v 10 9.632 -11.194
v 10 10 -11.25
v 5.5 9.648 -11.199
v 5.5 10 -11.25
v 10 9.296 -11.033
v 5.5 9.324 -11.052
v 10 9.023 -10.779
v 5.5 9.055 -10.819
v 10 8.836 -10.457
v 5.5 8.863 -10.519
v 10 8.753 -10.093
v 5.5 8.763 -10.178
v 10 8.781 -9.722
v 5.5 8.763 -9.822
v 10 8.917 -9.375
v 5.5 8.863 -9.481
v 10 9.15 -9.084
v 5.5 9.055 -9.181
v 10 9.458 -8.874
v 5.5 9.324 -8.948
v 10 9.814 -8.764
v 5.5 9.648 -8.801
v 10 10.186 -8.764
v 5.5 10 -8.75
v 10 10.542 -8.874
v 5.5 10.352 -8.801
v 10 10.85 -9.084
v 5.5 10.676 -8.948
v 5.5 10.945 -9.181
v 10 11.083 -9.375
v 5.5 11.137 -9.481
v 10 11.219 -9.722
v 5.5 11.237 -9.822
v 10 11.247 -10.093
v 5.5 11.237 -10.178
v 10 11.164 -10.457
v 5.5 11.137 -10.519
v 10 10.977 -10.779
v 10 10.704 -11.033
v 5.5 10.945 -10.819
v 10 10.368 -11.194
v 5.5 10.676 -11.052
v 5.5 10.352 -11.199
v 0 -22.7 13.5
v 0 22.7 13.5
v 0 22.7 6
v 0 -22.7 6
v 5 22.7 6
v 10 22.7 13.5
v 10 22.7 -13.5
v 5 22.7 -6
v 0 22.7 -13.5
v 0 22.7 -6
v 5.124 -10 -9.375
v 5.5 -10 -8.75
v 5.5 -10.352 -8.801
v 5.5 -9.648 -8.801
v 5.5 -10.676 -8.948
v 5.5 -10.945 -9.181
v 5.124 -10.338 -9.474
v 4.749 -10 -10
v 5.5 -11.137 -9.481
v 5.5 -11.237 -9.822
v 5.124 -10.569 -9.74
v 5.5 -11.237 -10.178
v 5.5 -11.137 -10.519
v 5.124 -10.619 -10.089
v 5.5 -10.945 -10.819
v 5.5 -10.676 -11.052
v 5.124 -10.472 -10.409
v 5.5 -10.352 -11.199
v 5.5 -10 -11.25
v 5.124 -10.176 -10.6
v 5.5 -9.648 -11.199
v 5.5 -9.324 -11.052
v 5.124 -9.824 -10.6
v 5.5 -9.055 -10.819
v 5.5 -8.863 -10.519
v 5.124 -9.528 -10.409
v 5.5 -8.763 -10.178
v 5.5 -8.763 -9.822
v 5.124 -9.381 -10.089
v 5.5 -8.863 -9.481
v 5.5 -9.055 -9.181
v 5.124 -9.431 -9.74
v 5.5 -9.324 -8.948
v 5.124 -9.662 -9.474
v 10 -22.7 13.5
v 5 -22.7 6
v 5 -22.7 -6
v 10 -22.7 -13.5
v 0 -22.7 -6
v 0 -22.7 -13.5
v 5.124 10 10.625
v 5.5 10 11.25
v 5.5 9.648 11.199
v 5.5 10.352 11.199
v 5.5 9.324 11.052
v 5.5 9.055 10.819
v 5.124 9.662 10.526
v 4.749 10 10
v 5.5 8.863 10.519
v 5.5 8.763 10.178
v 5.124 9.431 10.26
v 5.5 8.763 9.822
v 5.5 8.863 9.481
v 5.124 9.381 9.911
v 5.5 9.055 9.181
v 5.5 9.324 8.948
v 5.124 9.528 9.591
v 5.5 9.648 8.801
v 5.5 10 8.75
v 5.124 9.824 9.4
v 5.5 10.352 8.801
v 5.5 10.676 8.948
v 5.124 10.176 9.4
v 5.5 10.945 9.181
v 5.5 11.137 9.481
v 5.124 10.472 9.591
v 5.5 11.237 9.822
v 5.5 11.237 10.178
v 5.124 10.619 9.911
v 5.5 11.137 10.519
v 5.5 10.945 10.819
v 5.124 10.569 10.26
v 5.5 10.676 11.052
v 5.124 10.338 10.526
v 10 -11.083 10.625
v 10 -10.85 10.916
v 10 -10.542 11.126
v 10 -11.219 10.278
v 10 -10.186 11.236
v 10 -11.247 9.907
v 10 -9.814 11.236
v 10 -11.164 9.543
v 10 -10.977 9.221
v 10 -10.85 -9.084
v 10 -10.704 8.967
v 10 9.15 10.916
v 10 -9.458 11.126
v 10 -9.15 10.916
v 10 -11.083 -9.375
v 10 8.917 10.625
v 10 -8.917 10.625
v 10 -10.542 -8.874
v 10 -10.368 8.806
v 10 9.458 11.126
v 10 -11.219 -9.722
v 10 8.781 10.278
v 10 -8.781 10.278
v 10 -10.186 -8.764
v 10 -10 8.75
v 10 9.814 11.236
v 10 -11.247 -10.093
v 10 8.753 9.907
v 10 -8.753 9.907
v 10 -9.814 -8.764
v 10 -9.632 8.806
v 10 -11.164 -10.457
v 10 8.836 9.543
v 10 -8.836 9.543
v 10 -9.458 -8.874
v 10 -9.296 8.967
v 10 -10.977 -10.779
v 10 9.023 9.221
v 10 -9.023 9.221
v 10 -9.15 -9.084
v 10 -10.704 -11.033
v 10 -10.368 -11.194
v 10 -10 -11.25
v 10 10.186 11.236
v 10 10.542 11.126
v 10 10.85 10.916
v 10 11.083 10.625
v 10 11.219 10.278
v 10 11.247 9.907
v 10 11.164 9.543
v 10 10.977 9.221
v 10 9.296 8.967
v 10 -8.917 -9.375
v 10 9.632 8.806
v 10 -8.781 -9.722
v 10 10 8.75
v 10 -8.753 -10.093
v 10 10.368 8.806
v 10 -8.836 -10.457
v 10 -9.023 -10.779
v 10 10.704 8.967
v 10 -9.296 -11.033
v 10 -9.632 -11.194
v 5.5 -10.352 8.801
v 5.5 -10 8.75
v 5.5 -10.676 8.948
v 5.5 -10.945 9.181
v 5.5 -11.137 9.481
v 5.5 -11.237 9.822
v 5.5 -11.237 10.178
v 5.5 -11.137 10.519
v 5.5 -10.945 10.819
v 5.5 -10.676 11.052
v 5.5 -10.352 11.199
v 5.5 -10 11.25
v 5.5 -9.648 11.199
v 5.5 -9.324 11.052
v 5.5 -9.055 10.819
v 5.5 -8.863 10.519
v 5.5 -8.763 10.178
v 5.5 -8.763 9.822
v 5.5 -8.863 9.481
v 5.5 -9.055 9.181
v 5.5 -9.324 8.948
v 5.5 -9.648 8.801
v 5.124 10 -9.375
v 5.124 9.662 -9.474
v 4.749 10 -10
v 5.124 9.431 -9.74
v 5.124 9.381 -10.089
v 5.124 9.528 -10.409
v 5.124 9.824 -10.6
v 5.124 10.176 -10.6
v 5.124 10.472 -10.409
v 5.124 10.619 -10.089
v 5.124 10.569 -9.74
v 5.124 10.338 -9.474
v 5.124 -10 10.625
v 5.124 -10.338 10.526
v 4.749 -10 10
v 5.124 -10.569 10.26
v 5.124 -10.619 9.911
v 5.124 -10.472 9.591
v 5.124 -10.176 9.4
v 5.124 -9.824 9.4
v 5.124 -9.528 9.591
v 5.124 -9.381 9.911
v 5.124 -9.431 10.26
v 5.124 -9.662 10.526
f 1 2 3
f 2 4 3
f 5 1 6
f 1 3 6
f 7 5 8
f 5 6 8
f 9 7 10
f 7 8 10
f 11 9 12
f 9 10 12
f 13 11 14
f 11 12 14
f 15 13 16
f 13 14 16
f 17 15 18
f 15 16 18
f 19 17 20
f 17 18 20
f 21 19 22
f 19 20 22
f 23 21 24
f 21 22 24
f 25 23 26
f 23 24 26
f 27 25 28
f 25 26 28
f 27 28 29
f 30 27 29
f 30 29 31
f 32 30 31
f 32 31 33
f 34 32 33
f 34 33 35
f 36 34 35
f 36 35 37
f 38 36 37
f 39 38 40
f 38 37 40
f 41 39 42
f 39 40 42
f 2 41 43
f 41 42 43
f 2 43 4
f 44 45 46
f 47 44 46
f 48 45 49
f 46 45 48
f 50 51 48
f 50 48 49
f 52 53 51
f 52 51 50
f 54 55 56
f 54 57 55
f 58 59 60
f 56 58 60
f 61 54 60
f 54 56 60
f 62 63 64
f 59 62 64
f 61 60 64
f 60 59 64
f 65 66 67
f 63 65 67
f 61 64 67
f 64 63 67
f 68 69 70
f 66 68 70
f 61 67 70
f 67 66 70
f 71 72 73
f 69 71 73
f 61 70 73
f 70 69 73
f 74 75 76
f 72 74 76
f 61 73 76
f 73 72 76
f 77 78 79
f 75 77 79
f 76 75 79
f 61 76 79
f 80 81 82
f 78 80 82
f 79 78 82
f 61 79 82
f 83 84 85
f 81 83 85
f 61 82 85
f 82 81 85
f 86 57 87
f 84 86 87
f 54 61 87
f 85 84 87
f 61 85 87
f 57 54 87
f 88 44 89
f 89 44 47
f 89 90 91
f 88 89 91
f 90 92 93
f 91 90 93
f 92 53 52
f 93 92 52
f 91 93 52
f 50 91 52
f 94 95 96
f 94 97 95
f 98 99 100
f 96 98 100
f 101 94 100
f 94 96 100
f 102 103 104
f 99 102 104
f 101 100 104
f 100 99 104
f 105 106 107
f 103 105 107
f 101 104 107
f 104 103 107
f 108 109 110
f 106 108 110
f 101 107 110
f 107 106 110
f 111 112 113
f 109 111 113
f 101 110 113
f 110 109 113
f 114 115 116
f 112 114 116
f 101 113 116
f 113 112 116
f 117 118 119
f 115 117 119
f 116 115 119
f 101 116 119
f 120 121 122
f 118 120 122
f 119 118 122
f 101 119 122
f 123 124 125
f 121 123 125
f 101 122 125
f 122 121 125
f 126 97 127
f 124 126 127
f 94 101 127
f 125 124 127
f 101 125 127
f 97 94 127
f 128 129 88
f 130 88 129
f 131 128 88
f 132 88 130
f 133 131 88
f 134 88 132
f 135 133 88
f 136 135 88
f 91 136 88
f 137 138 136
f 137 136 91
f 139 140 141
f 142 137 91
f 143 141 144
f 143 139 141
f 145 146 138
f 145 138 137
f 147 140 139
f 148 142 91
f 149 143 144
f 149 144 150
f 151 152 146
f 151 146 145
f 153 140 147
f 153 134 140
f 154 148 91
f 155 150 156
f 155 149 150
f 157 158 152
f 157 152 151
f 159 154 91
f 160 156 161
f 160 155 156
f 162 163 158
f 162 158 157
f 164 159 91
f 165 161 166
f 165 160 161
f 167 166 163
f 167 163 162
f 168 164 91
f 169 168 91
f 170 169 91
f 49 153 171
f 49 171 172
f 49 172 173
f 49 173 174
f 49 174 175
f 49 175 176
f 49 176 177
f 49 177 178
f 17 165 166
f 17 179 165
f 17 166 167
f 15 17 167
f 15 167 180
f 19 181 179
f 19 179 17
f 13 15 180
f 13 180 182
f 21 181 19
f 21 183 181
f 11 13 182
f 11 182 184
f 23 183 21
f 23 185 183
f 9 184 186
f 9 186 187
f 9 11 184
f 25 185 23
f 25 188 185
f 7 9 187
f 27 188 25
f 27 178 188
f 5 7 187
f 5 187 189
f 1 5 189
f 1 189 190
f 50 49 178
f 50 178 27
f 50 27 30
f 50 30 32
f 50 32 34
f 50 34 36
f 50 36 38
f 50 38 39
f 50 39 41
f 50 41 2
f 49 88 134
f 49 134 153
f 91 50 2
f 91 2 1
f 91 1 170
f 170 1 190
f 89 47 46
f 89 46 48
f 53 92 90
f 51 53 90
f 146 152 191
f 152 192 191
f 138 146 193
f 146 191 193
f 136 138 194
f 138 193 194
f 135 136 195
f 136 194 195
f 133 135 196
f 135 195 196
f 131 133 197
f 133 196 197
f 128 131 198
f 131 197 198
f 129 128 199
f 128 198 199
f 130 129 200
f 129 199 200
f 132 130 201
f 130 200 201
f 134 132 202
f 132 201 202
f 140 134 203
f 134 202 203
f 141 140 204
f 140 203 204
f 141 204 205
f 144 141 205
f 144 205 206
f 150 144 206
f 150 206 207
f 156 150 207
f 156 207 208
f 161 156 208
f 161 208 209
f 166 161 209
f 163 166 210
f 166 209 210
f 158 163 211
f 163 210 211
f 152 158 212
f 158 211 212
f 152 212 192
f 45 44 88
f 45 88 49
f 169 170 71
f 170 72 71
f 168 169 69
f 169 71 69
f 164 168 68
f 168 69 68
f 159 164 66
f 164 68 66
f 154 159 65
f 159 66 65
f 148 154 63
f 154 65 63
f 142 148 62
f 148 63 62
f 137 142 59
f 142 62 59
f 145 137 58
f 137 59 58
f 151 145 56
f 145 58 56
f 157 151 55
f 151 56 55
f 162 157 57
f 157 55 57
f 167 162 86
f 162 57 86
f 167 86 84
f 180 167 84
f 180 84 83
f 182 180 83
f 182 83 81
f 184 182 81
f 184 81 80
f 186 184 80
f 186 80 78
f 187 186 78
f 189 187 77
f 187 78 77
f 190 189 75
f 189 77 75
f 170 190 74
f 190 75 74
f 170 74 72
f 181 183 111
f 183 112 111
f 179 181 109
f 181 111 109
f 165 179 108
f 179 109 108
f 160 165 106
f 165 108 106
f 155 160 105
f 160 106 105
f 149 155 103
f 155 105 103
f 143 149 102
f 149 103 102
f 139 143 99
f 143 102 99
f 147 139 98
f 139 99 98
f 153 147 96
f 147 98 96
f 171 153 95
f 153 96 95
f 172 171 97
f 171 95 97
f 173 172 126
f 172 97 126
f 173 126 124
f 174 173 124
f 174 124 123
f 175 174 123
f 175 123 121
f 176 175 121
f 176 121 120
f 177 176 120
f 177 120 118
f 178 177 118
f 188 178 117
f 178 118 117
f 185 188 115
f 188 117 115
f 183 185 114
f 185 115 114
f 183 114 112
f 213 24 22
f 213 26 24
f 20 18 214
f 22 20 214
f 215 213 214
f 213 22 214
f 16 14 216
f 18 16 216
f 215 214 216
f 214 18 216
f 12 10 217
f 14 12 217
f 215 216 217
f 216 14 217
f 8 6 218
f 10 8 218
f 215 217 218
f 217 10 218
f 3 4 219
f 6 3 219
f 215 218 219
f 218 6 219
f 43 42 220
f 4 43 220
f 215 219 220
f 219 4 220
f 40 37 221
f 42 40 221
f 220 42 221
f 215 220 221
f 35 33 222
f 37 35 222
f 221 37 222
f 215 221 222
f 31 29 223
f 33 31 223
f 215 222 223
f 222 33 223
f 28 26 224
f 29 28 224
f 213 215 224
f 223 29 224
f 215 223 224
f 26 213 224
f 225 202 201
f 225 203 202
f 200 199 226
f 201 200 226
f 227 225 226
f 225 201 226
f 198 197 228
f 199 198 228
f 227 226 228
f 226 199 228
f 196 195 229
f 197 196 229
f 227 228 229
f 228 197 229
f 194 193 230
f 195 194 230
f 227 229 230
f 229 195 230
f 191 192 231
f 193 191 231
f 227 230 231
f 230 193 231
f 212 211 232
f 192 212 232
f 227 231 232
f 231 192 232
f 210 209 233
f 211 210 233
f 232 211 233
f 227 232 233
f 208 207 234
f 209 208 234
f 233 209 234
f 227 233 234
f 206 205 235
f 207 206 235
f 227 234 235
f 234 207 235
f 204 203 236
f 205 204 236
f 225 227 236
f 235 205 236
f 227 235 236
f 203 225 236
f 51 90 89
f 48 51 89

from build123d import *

# Parameters (mm, degrees)
SKETCH_1_W             = 27
SKETCH_1_H             = 45.4
EXTRUDE_1_DEPTH        = 10
SKETCH_2_W             = 5
SKETCH_2_H             = 12
CUT_EXTRUDE_1_DEPTH    = 49.408780195
HOLE_WIZARD_M3_1_D     = 2.5
HOLE_WIZARD_M3_1_DEPTH = 4.5
HOLE_WIZARD_M3_1_TIP   = 0.751075774


with BuildPart() as part:
    # 草圖1 → 伸長1 (new body)
    with BuildSketch(Plane(origin=(0, 0, 0), x_dir=(0, 0, -1), z_dir=(1, 0, 0))):
        Rectangle(SKETCH_1_W, SKETCH_1_H)
    extrude(amount=EXTRUDE_1_DEPTH)

    # 草圖2 → 除料-伸長1 (cut, through all)
    with BuildSketch(Plane.XZ.offset(22.7)):
        with Locations((2.5, 0)):
            Rectangle(SKETCH_2_W, SKETCH_2_H)
    extrude(amount=-CUT_EXTRUDE_1_DEPTH, mode=Mode.SUBTRACT)

    # M3 螺紋孔1
    with Locations(Plane(origin=(10, 10, -10), x_dir=(0, 0, 1), z_dir=(1, 0, 0))):
        with Locations((0, 0), (0, 20), (20, 0), (20, 20)):
            Hole(HOLE_WIZARD_M3_1_D / 2, depth=HOLE_WIZARD_M3_1_DEPTH)
            with Locations((0, 0, -(HOLE_WIZARD_M3_1_DEPTH + HOLE_WIZARD_M3_1_TIP / 2))):  # 118° drill point
                Cone(0, HOLE_WIZARD_M3_1_D / 2, HOLE_WIZARD_M3_1_TIP, mode=Mode.SUBTRACT)


solid = part.part
